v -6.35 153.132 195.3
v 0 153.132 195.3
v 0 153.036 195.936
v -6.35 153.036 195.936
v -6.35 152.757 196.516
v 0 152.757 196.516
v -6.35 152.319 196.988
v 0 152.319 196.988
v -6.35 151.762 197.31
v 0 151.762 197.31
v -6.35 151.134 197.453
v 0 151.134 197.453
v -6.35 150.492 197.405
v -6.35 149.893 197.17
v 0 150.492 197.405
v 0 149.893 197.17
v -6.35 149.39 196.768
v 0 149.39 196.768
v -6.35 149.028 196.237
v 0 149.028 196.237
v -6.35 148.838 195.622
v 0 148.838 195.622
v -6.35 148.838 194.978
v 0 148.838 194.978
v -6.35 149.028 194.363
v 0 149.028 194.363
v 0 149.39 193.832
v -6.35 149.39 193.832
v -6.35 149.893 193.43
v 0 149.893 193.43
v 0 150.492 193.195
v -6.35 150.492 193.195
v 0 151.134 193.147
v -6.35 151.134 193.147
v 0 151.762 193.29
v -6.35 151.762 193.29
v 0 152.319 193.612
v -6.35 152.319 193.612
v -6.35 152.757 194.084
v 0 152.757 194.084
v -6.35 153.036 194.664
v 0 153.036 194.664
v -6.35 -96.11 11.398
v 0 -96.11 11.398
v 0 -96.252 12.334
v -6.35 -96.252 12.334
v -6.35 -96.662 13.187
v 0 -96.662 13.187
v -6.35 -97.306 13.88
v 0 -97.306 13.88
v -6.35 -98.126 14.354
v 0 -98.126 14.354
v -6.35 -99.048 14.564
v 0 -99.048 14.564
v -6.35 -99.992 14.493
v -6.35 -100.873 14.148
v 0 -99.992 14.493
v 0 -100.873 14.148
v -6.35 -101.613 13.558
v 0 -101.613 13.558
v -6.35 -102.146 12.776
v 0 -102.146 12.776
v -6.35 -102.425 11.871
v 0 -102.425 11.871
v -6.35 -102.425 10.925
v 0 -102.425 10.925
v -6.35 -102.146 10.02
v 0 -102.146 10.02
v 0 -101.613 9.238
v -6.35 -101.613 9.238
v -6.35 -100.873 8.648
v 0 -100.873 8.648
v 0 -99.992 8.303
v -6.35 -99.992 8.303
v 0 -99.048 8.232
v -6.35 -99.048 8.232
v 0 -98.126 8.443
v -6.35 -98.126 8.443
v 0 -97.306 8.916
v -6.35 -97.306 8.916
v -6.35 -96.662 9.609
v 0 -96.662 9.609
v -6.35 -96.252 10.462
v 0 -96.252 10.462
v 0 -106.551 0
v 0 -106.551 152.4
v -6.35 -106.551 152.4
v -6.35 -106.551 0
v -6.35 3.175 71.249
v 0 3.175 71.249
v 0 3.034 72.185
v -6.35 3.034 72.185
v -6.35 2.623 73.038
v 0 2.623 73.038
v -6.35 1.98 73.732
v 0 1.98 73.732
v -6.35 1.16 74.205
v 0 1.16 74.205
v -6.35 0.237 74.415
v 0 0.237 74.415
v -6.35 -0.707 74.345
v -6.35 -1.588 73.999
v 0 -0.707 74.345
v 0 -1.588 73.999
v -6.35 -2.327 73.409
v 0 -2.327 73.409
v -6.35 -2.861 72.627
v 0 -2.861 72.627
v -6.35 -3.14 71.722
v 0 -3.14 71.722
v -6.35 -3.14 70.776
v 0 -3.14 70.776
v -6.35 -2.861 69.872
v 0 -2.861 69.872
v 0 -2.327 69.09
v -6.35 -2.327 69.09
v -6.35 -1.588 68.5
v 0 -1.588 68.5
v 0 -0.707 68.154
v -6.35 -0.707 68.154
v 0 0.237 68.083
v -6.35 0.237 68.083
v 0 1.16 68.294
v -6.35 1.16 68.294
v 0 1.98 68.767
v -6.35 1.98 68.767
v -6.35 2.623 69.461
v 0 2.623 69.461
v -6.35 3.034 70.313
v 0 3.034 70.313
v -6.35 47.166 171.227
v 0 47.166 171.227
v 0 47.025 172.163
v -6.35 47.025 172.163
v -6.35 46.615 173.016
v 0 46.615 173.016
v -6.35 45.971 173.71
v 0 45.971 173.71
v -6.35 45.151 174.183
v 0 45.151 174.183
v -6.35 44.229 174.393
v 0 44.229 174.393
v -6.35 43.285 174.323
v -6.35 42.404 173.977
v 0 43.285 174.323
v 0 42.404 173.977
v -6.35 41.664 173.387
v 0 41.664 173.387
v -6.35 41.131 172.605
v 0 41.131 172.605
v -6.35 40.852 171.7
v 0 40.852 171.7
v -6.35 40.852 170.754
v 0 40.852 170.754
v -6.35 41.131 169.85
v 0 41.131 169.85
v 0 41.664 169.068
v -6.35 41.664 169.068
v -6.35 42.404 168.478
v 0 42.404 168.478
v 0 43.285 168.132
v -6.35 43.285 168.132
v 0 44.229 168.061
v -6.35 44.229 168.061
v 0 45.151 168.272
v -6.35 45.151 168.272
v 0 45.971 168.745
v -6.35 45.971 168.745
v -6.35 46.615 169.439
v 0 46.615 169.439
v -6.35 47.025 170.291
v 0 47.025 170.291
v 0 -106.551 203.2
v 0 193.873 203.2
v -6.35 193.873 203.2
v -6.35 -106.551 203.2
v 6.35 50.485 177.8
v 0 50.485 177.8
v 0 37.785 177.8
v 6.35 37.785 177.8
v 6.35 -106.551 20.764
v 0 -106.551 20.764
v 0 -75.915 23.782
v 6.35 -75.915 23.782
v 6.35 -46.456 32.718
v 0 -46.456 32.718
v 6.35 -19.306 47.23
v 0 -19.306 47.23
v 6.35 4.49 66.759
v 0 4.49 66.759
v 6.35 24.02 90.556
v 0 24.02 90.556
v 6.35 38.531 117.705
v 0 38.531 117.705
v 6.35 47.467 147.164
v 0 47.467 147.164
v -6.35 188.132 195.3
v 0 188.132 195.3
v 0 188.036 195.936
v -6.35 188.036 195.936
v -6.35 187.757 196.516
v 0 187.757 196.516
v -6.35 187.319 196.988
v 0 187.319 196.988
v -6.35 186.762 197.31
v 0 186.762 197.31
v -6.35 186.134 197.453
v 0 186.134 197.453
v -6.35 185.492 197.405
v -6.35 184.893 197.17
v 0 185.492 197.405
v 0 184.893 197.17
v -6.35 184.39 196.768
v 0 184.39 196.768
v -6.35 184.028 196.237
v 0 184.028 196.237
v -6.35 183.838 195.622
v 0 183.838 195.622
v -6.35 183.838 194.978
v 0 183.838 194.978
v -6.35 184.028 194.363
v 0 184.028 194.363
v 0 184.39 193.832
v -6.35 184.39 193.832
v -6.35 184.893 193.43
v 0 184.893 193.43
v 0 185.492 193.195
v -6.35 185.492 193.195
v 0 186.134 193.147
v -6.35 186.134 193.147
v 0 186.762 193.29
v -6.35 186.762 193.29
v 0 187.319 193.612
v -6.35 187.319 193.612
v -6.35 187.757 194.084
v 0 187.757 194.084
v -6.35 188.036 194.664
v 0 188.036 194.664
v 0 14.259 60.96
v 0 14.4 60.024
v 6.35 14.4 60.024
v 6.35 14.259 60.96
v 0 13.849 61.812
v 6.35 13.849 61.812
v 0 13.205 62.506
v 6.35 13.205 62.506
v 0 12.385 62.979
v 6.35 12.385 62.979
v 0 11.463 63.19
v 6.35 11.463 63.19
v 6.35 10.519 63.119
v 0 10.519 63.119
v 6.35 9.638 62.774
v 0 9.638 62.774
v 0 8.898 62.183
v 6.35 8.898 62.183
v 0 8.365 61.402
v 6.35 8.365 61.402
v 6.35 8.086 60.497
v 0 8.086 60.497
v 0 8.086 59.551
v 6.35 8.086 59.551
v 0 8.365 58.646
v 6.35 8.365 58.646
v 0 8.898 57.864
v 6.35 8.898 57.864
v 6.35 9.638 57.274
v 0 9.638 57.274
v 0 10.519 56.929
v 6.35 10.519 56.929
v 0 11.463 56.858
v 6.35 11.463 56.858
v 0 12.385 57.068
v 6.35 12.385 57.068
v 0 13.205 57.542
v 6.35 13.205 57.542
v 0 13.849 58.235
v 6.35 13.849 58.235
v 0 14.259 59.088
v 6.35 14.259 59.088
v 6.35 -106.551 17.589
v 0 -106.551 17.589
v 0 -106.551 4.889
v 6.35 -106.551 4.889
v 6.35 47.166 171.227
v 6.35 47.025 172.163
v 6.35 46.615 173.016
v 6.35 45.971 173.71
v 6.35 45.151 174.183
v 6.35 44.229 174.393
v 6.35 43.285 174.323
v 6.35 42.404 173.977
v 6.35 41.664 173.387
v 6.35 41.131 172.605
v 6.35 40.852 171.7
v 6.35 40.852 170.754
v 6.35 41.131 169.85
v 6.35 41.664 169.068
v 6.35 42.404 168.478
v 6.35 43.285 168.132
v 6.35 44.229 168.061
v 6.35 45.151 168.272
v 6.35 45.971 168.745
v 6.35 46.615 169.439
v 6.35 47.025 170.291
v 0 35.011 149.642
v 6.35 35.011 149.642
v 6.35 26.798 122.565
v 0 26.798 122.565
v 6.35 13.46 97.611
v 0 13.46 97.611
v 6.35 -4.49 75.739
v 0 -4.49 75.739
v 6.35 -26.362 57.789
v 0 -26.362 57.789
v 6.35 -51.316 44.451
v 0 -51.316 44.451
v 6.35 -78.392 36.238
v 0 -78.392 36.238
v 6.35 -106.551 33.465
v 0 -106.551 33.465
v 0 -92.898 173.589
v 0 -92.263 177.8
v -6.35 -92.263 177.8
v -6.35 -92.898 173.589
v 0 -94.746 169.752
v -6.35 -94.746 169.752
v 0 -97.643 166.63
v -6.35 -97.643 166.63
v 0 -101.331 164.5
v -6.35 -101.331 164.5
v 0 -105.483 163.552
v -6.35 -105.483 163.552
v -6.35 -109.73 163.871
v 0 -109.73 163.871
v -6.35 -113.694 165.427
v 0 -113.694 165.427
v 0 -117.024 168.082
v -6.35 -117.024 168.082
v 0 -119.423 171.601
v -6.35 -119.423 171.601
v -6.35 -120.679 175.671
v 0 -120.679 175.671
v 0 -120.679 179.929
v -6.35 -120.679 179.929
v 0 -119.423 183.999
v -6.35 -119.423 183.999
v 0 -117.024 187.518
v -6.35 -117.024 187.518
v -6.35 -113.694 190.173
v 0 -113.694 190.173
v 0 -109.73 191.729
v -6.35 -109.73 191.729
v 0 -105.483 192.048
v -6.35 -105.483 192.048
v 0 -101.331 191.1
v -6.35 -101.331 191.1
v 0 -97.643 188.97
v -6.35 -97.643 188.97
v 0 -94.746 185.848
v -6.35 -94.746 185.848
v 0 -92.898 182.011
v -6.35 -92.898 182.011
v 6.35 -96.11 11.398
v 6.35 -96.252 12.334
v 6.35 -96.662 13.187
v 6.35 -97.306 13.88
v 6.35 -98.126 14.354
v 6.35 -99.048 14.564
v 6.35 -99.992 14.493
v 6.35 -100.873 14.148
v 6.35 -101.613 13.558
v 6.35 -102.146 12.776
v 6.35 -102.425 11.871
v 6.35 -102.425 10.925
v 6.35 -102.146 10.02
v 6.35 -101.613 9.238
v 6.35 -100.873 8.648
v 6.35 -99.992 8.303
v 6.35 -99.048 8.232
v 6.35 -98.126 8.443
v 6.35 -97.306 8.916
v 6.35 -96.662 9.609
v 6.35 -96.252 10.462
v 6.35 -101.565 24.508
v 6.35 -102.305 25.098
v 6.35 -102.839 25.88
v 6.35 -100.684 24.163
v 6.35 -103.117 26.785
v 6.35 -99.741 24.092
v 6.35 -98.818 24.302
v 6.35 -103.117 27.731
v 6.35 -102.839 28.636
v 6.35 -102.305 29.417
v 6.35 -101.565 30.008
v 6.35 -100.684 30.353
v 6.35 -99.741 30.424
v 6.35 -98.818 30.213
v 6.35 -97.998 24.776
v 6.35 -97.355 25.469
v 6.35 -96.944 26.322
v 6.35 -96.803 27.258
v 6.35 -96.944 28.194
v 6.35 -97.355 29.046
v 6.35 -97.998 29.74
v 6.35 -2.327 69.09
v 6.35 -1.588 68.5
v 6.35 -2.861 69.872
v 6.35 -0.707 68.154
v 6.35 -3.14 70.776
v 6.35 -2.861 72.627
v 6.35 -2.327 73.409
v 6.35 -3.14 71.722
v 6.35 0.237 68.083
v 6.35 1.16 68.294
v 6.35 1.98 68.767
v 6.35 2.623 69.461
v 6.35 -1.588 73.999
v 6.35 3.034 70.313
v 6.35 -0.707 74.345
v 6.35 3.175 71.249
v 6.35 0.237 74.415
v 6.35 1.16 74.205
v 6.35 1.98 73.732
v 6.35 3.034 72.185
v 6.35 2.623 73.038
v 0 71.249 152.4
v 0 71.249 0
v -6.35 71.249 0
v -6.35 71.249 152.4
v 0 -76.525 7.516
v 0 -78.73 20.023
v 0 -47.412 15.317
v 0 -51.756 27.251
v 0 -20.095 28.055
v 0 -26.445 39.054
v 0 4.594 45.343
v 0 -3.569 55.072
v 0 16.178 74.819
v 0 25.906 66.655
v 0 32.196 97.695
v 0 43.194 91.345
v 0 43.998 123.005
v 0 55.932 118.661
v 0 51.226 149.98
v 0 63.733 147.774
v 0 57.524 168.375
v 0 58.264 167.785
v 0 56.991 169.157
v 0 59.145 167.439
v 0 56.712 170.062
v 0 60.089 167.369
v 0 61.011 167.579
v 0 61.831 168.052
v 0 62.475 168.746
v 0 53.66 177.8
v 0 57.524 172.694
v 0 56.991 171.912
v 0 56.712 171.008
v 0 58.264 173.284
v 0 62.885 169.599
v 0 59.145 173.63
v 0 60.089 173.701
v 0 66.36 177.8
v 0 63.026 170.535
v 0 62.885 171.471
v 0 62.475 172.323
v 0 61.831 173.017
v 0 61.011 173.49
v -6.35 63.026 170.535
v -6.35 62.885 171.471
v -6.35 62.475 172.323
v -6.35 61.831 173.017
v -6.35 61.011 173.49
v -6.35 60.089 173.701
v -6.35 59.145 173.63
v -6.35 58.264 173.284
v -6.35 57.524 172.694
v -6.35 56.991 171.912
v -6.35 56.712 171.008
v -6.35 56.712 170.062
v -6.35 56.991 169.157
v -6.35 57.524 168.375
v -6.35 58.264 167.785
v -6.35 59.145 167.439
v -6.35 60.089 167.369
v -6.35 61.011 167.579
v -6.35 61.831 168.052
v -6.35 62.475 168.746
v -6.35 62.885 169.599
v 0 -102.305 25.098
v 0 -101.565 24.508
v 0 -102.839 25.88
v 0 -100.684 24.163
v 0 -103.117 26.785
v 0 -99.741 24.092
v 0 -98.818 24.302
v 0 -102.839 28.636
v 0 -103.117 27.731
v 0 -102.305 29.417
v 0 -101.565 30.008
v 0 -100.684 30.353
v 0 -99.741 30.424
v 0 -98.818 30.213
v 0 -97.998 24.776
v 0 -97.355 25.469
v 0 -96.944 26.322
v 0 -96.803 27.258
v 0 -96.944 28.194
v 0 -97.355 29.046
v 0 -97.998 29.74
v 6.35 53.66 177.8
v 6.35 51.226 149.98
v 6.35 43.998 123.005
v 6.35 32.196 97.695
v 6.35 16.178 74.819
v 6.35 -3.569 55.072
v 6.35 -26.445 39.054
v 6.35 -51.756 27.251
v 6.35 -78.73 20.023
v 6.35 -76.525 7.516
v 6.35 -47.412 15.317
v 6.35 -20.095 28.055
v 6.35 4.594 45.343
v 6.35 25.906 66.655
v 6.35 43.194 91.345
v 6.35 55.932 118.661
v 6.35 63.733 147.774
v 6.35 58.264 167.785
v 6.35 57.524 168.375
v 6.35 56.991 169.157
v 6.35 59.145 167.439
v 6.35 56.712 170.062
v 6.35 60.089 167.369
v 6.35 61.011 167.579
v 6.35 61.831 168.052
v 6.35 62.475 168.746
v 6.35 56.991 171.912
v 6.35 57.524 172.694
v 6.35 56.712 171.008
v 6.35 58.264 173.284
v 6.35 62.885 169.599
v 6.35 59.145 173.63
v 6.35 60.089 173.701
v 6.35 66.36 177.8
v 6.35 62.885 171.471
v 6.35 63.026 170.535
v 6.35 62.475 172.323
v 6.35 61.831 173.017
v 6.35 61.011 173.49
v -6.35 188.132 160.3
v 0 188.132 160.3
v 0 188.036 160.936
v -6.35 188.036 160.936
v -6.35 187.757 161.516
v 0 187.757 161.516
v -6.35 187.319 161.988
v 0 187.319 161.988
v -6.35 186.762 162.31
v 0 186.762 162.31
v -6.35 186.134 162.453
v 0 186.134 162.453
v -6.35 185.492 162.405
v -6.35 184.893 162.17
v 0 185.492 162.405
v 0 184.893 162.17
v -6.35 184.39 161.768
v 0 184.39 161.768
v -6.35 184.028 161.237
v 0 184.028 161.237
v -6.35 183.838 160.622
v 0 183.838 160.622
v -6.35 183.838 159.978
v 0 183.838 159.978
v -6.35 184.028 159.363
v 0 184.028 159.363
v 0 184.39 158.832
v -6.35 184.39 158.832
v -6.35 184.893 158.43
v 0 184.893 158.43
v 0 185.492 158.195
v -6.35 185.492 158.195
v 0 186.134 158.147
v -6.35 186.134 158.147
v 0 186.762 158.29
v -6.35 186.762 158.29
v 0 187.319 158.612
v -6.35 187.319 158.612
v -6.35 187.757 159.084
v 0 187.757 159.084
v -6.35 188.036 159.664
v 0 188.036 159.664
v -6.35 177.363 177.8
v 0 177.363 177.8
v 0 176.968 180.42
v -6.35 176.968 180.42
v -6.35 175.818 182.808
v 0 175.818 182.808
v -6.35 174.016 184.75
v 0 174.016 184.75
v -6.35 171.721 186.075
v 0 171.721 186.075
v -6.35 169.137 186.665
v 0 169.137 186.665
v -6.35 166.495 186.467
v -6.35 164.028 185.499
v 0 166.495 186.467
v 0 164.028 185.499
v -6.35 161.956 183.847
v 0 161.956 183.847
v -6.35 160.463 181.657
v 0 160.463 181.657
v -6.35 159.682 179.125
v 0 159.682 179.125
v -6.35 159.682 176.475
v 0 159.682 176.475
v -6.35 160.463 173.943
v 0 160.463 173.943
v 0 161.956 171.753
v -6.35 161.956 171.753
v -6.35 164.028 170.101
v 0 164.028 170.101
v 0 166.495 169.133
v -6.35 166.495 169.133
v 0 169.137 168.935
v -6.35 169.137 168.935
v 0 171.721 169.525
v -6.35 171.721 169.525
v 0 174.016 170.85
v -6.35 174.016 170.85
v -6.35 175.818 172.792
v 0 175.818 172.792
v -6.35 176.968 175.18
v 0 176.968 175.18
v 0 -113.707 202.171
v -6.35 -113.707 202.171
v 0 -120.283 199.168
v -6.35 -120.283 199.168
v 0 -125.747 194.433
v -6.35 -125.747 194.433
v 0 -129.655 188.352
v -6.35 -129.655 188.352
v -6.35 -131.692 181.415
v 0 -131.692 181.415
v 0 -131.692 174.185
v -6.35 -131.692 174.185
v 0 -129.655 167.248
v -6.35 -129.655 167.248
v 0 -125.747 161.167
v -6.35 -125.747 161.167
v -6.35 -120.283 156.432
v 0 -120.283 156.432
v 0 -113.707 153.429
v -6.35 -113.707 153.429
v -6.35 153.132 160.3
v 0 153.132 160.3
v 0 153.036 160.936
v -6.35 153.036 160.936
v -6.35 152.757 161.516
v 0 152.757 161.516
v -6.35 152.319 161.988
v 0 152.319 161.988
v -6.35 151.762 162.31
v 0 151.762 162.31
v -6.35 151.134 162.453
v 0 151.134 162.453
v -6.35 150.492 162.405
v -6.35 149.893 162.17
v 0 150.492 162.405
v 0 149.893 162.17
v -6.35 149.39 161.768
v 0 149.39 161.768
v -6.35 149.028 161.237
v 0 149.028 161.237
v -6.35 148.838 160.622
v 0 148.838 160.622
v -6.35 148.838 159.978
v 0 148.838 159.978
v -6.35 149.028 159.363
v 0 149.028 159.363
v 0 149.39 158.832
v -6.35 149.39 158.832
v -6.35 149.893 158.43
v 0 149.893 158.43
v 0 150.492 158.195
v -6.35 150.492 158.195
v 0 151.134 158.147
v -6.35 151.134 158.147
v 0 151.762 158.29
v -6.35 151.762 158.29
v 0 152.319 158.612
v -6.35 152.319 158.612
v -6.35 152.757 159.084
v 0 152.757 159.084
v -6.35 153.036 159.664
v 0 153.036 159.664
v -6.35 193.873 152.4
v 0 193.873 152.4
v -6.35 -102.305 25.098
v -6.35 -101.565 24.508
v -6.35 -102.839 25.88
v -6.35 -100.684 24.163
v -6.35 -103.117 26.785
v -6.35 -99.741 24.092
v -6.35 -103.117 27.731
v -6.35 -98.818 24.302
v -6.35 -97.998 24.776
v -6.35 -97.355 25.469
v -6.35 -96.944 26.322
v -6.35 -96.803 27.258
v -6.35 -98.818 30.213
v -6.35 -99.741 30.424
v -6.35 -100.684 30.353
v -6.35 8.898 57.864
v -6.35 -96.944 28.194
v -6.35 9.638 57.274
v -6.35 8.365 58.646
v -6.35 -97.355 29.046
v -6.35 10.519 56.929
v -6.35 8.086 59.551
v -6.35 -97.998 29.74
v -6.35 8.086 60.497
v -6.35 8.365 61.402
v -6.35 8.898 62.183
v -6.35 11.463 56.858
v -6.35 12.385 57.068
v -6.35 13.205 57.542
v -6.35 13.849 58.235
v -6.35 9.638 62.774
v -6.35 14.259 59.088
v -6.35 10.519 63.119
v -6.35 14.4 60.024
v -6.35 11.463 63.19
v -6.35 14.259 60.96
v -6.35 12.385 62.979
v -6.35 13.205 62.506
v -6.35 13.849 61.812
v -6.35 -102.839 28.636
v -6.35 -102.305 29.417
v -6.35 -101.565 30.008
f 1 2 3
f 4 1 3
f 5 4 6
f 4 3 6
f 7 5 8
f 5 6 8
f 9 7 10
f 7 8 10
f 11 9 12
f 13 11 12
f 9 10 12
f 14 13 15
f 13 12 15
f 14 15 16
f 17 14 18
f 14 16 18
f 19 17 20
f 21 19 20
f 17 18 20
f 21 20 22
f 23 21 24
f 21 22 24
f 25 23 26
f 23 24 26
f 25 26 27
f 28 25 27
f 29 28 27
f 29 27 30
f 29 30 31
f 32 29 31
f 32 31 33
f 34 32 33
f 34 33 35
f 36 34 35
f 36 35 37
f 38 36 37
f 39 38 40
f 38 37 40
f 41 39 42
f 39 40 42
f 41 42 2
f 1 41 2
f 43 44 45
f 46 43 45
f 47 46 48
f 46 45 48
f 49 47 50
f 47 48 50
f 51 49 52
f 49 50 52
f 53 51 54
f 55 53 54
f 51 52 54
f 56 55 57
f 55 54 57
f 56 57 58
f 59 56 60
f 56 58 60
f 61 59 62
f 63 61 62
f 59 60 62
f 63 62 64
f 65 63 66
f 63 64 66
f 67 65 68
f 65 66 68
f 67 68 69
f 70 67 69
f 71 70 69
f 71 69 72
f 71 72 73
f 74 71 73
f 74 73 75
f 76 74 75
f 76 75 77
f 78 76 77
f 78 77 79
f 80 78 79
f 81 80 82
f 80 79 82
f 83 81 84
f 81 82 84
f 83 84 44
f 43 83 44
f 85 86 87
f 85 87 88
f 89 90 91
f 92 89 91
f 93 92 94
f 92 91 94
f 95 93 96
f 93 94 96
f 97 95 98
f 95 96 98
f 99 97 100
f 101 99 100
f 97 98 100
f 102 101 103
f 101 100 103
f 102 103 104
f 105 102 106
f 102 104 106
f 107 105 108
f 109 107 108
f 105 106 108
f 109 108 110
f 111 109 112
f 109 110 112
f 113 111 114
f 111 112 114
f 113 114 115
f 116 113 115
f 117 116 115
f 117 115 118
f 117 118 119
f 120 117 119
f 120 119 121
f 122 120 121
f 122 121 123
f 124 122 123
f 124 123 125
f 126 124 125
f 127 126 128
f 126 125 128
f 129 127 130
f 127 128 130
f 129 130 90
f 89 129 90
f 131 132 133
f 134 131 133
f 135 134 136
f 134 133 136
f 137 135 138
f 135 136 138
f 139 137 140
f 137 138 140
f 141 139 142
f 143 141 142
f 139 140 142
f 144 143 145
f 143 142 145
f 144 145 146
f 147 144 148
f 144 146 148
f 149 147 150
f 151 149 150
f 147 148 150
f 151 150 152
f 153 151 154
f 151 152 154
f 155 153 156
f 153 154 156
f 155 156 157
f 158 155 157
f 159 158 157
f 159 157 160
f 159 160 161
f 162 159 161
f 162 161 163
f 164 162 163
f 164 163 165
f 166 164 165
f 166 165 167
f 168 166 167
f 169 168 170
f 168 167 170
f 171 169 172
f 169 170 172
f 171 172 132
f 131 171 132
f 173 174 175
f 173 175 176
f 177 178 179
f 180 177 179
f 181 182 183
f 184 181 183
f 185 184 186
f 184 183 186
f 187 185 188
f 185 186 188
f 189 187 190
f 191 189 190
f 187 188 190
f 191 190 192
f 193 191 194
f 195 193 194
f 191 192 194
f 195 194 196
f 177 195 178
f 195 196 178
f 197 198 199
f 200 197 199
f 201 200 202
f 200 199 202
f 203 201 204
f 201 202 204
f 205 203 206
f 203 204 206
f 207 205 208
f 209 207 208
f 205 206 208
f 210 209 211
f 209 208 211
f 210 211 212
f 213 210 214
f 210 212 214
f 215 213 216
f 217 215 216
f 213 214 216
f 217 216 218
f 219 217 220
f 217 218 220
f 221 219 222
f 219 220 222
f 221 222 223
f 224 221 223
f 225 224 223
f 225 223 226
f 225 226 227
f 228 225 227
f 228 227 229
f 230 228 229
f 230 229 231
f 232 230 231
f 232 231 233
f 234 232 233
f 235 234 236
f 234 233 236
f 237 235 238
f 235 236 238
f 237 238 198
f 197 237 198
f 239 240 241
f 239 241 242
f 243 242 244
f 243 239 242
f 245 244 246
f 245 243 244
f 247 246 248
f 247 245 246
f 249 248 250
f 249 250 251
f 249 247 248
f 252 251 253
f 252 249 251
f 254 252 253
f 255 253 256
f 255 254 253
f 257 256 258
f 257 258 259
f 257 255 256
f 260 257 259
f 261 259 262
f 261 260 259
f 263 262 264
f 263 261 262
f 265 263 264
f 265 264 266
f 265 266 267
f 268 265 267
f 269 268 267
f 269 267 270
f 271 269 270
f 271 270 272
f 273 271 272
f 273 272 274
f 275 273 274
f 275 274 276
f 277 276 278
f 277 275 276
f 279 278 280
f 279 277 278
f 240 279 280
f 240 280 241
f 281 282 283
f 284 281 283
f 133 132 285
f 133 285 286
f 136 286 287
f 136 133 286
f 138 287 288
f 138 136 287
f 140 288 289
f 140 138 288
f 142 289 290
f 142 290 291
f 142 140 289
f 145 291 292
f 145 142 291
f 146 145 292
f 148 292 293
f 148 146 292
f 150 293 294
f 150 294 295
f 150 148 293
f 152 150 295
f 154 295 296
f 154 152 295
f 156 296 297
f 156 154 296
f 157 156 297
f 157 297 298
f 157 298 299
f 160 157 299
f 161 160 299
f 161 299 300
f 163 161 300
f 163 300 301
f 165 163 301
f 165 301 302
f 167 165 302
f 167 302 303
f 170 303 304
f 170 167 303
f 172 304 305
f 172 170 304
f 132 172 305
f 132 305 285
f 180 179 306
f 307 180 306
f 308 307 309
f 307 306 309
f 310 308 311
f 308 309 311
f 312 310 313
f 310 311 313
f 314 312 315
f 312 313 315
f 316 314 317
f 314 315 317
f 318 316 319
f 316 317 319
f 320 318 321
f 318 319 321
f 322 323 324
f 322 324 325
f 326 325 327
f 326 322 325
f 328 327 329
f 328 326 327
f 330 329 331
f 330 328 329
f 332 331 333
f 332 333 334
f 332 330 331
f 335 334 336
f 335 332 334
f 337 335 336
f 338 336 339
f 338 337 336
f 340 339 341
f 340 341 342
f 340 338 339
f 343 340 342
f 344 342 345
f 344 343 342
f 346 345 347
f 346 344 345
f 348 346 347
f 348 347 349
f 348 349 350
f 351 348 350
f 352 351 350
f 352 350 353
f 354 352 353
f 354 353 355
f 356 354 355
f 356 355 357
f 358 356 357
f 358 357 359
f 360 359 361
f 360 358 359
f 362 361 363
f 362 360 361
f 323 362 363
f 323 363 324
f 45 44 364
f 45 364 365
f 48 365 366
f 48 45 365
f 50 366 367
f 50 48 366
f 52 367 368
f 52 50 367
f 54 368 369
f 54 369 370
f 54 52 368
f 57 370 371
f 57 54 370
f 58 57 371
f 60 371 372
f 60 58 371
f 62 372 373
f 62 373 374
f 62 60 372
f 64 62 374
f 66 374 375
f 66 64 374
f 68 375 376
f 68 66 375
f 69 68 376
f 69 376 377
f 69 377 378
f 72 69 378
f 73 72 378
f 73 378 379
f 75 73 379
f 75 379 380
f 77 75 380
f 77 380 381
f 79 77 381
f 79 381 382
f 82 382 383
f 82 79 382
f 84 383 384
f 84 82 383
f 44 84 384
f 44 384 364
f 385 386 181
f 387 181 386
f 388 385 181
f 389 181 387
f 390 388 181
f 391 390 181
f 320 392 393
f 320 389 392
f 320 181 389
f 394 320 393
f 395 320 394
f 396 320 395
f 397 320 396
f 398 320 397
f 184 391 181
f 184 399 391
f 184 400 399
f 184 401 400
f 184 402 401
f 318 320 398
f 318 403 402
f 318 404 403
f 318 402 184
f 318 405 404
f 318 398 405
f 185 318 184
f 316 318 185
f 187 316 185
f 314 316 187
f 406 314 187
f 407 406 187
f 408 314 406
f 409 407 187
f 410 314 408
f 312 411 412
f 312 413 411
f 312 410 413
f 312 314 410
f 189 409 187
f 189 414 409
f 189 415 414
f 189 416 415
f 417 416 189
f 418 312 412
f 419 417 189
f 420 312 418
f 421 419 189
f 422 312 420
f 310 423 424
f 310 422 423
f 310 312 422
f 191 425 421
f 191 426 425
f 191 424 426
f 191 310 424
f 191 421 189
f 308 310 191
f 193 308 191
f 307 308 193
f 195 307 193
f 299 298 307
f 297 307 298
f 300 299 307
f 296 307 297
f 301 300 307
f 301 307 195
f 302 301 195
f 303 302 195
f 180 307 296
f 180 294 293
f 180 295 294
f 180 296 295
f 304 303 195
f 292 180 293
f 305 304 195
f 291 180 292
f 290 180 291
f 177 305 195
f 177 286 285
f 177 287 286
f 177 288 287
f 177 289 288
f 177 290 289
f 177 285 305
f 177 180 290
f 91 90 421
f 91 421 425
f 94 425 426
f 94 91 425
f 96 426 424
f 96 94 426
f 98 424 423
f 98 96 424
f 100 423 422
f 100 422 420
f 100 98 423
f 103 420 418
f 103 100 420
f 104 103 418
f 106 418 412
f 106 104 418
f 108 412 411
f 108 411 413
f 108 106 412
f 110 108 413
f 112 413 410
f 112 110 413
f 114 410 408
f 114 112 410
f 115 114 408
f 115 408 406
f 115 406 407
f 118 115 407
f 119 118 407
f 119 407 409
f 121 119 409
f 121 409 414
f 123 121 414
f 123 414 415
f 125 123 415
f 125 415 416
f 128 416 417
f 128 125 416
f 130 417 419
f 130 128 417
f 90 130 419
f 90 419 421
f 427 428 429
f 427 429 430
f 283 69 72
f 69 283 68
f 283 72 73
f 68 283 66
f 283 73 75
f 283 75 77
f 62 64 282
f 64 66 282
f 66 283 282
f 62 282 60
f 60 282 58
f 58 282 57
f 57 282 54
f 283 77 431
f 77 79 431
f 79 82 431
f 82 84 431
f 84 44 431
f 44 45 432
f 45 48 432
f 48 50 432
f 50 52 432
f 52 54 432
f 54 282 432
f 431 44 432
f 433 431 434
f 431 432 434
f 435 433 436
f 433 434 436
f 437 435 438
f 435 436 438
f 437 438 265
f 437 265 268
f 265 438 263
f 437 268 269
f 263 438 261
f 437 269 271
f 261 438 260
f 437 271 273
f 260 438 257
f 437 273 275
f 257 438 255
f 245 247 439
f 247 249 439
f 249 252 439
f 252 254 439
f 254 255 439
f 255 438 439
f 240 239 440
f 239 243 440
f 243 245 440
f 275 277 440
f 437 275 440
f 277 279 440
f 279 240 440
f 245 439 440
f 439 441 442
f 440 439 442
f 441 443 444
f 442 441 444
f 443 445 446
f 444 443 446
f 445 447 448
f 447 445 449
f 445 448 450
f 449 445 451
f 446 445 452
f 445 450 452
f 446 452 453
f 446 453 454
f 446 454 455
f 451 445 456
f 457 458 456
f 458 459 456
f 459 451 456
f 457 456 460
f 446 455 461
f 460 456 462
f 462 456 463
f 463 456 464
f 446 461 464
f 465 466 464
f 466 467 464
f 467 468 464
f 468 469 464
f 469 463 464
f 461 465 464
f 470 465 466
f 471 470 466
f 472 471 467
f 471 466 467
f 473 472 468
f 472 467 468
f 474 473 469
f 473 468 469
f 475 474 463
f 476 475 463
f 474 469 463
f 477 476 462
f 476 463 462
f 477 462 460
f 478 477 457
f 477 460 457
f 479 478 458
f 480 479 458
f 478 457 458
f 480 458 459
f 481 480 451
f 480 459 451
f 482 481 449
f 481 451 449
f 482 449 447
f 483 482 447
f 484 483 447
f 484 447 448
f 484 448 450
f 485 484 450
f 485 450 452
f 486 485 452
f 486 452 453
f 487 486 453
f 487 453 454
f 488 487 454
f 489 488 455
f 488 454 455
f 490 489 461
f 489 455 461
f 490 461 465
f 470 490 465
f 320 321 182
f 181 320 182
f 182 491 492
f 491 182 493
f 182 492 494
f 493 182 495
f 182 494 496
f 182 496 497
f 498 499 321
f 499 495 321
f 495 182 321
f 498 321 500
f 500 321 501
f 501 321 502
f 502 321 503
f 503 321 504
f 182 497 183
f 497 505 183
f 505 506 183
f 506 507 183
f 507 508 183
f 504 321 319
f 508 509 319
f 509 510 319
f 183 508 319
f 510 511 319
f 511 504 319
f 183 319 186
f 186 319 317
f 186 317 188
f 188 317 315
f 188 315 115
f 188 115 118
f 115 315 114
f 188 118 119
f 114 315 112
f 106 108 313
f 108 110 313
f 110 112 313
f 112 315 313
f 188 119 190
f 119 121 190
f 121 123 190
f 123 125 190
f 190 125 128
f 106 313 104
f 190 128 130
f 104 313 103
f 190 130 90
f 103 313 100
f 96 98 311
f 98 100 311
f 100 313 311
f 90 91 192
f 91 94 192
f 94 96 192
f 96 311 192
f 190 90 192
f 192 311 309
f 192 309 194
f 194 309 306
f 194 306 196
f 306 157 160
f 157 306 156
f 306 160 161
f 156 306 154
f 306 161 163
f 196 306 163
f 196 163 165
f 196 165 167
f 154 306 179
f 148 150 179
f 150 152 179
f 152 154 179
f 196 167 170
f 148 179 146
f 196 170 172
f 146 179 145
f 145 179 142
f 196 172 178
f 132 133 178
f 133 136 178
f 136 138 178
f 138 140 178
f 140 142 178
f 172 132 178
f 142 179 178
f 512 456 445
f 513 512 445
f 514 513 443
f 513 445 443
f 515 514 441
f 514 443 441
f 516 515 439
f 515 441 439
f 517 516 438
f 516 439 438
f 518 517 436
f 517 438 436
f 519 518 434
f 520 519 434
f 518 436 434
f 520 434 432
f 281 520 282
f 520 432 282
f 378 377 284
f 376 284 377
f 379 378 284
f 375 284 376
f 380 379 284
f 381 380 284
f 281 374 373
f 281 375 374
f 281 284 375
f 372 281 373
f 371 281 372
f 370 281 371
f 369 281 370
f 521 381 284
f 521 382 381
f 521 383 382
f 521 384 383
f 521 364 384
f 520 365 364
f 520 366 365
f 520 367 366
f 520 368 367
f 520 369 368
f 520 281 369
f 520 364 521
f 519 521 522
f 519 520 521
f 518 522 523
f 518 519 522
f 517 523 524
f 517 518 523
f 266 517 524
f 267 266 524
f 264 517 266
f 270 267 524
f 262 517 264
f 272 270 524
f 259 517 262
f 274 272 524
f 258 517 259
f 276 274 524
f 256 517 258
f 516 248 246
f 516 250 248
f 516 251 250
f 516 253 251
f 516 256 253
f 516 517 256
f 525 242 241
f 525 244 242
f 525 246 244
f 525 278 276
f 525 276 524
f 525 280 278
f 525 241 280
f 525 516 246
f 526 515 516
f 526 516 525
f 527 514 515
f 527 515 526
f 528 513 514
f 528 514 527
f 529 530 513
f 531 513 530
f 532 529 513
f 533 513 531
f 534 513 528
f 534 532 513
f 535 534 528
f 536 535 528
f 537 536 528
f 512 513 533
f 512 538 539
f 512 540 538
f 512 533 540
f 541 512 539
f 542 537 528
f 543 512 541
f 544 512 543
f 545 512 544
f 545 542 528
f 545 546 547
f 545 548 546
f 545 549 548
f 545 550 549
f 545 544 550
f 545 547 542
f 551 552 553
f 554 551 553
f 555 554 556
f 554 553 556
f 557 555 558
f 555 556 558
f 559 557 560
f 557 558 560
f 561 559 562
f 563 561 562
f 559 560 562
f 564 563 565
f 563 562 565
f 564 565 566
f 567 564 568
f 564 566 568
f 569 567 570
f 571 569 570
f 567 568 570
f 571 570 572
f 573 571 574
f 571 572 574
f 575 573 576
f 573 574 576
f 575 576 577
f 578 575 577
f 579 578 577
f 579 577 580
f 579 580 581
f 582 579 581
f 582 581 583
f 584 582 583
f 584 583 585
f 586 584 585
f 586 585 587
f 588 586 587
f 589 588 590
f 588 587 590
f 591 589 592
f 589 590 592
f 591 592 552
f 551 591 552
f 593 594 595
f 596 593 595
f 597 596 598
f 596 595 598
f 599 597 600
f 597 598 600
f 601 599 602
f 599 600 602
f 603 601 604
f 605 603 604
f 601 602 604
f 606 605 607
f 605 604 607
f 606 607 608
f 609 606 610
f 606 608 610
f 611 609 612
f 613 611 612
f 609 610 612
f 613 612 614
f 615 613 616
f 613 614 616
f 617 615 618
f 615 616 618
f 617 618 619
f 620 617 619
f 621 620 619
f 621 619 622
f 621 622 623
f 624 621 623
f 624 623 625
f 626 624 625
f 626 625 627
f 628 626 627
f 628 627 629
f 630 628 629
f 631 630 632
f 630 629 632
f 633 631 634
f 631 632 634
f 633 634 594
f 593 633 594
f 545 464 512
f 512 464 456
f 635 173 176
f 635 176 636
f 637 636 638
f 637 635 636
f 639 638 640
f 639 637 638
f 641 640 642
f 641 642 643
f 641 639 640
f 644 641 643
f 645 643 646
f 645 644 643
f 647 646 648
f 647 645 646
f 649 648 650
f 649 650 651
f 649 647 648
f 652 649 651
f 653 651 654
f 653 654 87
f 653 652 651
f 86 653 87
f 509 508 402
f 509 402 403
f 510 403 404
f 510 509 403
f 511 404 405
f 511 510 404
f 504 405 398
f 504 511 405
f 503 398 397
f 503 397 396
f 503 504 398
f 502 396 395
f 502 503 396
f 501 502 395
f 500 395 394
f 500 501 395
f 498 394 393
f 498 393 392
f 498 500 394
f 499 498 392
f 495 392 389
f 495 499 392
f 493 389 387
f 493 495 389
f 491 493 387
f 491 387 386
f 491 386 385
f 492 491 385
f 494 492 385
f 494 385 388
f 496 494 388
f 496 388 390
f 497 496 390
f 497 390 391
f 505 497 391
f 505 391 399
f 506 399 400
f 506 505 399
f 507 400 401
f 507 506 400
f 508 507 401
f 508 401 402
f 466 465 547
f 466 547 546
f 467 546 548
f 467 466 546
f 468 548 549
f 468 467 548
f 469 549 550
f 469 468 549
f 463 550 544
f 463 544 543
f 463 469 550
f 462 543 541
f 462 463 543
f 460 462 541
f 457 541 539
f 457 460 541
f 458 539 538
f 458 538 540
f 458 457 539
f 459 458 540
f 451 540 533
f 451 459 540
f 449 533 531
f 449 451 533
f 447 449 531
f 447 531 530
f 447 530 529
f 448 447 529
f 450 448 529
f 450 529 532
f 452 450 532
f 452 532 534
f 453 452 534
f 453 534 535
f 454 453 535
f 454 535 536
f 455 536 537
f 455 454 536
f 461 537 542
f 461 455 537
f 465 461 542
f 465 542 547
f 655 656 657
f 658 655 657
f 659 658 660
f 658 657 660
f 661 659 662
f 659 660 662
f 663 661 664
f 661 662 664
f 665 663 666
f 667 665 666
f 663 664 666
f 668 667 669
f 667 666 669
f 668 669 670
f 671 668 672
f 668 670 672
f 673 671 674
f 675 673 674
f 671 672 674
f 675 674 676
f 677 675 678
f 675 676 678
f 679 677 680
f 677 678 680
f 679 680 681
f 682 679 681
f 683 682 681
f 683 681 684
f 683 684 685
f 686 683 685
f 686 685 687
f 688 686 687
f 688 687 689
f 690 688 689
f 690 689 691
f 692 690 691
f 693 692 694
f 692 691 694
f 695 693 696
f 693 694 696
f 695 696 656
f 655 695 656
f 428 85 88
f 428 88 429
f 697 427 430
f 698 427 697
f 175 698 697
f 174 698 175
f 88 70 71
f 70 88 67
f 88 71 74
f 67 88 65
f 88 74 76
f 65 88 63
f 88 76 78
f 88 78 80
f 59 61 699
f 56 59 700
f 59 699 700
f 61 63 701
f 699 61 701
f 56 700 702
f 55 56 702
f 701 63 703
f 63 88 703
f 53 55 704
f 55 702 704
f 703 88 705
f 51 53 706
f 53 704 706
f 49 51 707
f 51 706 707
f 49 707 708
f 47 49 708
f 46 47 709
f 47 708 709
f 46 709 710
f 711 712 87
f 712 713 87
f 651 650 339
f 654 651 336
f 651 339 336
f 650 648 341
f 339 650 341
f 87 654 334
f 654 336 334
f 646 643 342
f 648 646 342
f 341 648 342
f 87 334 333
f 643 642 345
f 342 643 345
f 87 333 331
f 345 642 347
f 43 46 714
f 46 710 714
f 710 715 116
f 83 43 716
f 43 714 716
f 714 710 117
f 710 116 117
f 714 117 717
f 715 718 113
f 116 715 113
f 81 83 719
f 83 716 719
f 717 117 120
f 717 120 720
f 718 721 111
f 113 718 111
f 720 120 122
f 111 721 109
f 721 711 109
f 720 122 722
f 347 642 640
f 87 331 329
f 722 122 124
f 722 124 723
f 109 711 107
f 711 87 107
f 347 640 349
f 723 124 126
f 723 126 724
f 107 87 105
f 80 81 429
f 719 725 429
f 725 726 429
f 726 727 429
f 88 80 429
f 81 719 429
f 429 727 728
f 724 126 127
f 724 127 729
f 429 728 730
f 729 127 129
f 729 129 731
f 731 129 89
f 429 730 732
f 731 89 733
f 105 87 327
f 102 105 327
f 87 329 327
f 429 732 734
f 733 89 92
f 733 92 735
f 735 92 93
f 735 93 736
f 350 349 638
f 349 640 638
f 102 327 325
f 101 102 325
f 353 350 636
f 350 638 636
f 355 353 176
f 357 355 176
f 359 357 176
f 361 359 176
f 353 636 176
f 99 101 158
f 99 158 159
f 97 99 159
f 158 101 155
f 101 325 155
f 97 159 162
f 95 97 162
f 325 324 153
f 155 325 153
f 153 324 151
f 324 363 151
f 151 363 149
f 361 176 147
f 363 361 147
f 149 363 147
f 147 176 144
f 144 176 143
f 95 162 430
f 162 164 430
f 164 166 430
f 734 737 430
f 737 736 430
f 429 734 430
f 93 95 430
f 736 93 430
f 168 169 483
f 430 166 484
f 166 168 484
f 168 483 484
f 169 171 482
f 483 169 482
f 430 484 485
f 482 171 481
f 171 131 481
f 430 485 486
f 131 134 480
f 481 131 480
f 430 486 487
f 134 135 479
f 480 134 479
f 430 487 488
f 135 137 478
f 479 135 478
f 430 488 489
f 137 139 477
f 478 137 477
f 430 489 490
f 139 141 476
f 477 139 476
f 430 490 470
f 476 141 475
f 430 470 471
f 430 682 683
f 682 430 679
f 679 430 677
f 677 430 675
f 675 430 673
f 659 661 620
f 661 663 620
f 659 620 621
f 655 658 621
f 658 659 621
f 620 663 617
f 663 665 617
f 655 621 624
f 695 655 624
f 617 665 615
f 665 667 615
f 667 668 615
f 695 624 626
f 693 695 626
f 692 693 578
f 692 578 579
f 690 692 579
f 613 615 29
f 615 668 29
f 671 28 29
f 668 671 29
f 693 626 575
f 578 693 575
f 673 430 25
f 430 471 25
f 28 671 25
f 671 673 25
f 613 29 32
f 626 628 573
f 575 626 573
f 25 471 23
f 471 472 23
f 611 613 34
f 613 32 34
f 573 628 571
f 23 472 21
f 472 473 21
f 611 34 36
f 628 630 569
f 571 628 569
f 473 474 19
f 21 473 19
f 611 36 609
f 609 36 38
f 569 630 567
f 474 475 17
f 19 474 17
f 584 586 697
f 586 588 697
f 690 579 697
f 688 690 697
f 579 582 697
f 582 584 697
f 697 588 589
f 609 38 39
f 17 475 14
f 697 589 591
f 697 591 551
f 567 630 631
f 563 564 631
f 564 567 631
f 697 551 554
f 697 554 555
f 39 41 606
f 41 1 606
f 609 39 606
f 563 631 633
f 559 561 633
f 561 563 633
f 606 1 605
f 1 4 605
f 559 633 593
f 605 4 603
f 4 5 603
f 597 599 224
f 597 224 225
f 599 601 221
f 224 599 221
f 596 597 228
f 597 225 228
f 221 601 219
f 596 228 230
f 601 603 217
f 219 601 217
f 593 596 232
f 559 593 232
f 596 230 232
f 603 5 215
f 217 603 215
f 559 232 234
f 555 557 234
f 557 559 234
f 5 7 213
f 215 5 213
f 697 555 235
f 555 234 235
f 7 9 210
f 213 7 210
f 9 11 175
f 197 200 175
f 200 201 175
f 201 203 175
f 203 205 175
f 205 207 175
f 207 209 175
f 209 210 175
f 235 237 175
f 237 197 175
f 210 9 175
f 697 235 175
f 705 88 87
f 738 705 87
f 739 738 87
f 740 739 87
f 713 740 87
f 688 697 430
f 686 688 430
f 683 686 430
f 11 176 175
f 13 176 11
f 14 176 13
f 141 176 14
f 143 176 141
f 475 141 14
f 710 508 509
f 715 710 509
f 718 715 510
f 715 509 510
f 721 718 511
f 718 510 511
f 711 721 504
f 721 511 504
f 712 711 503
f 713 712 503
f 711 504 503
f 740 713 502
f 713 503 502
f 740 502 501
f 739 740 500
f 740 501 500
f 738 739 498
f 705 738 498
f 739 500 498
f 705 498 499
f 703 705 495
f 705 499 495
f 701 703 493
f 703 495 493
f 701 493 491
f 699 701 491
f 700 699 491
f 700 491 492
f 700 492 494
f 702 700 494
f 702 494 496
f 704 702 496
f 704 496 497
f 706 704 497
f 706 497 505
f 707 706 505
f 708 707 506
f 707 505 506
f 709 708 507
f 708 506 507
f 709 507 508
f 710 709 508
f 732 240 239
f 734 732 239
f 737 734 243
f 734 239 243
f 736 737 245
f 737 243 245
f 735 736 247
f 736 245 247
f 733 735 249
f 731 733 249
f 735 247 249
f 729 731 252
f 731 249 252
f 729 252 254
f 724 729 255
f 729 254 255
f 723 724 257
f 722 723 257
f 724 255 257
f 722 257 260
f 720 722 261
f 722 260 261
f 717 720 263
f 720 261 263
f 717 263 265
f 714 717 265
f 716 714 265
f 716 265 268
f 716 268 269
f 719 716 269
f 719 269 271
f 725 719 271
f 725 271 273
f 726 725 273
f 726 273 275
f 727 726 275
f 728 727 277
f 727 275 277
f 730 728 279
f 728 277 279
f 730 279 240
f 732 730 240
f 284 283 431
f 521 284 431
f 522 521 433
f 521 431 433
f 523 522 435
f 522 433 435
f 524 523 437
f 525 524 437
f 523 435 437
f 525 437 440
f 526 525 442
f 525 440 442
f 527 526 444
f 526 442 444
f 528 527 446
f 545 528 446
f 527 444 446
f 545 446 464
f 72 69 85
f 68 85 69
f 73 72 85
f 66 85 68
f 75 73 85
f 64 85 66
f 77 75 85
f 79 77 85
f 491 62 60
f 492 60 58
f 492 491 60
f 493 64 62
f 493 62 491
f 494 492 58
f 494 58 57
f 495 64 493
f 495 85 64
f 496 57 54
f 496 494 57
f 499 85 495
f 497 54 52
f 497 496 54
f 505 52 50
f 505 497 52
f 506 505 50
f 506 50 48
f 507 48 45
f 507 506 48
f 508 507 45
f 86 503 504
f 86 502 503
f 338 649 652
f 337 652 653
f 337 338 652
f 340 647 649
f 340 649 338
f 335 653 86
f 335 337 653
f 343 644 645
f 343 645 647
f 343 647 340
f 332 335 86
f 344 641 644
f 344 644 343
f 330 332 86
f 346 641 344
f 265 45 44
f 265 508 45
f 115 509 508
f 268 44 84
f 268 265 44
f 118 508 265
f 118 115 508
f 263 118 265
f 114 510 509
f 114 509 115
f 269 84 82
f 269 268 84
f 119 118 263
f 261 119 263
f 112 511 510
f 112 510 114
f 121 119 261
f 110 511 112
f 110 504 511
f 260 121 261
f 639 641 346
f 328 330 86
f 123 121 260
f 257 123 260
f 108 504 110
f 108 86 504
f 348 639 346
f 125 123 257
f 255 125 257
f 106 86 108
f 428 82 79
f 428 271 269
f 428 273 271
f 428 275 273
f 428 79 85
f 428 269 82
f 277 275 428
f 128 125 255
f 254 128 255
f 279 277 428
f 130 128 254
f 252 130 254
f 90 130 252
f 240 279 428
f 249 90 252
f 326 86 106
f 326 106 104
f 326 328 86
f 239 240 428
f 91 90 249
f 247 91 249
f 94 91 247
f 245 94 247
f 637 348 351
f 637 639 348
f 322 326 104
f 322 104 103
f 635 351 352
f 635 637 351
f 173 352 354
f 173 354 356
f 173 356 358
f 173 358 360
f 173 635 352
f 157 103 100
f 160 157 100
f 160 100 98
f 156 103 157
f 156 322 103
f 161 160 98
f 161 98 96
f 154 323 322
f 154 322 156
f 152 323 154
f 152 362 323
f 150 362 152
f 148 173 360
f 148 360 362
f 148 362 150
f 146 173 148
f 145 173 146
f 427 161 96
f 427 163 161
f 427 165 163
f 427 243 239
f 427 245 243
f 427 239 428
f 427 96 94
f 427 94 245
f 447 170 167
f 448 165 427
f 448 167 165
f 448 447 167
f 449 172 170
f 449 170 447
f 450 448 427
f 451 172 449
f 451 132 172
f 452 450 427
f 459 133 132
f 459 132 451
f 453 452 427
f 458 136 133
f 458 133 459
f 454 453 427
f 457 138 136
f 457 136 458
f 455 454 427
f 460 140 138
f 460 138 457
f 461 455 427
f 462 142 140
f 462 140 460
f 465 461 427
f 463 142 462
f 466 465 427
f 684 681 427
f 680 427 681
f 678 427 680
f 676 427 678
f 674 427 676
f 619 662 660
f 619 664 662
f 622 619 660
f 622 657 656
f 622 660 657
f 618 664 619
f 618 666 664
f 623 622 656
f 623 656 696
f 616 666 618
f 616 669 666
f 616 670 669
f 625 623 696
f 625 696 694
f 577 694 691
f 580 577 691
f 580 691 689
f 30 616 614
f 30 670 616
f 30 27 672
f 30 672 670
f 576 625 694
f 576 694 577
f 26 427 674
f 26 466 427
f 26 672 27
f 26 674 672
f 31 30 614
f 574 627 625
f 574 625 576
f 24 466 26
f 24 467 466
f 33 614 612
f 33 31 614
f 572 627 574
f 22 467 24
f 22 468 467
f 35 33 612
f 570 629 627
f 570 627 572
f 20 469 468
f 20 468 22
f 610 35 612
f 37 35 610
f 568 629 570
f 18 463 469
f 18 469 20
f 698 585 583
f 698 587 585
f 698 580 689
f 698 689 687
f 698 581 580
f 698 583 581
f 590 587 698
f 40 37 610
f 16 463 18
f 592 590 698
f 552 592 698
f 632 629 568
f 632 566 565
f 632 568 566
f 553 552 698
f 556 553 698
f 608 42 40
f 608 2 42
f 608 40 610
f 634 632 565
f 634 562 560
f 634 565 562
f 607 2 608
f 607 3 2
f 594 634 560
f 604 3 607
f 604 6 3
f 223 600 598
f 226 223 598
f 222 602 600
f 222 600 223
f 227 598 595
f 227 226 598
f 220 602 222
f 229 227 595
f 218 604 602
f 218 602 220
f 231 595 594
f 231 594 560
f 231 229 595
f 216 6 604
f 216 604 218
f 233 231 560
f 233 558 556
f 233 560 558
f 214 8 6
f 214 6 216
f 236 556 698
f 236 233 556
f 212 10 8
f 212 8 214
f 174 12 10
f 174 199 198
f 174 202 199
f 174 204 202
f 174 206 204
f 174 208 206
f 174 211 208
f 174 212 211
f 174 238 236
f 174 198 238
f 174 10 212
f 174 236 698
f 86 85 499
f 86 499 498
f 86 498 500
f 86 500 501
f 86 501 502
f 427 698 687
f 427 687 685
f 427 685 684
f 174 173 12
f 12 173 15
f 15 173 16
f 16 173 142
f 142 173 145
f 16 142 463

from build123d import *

# Parameters (mm, degrees)
F0_R     = 2.159
F0_R_2   = 8.89
F0_R_3   = 3.175
F1_DEPTH = 6.35
F2_DEPTH = 6.35
F3_DEPTH = 6.35


with BuildPart() as f1:
    # F0 (on Right) → F1 (new body)
    with BuildSketch(Plane.YZ):
        with BuildLine():
            Line((-92.2632388765, 177.8), (-81.1507388765, 177.8))
            ThreePointArc((-81.1507388765, 177.8), (-88.5902266343, 195.7605122421), (-106.5507388765, 203.2))
            ThreePointArc((-106.5507388765, 203.2), (-131.9507388765, 177.8), (-106.5507388765, 152.4))
            Line((-106.5507388765, 152.4), (-106.5507388765, 163.5125))
            ThreePointArc((-106.5507388765, 163.5125), (-116.6535270127, 187.9027881362), (-92.2632388765, 177.8))
        make_face()
        with BuildLine():
            ThreePointArc((-106.5507388765, 152.4), (-88.5902266343, 159.8394877579), (-81.1507388765, 177.8))
            Line((-81.1507388765, 177.8), (-92.2632388765, 177.8))
            ThreePointArc((-92.2632388765, 177.8), (-96.4479507403, 167.6972118638), (-106.5507388765, 163.5125))
            Line((-106.5507388765, 163.5125), (-106.5507388765, 152.4))
        make_face()
        with BuildLine():
            ThreePointArc((-106.5507388765, 203.2), (-88.5902266343, 195.7605122421), (-81.1507388765, 177.8))
            Line((-81.1507388765, 177.8), (37.7847611235, 177.8))
            Line((37.7847611235, 177.8), (50.4847611235, 177.8))
            Line((50.4847611235, 177.8), (53.6597611235, 177.8))
            Line((53.6597611235, 177.8), (66.3597611235, 177.8))
            Line((66.3597611235, 177.8), (71.2492611235, 177.8))
            Line((71.2492611235, 177.8), (71.2492611235, 203.2))
            Line((71.2492611235, 203.2), (-106.5507388765, 203.2))
        make_face()
        Polygon((193.8728411235, 203.2), (71.2492611235, 203.2), (71.2492611235, 177.8), (71.2492611235, 152.4), (193.8728411235, 152.4), align=None)
        with Locations((150.9728411235, 160.3)):
            Circle(F0_R, mode=Mode.SUBTRACT)
        with Locations((185.9728411235, 160.3)):
            Circle(F0_R, mode=Mode.SUBTRACT)
        with Locations((150.9728411235, 195.3)):
            Circle(F0_R, mode=Mode.SUBTRACT)
        with Locations((168.4728411235, 177.8)):
            Circle(F0_R_2, mode=Mode.SUBTRACT)
        with Locations((185.9728411235, 195.3)):
            Circle(F0_R, mode=Mode.SUBTRACT)
        with BuildLine():
            Line((71.2492611235, 152.4), (71.2492611235, 177.8))
            Line((71.2492611235, 177.8), (66.3597611235, 177.8))
            ThreePointArc((66.3597611235, 177.8), (15.7154482119, 55.5338129116), (-106.5507388765, 4.8895))
            Line((-106.5507388765, 4.8895), (-106.5507388765, 0))
            Line((-106.5507388765, 0), (71.2492611235, 0))
            Line((71.2492611235, 0), (71.2492611235, 152.4))
        make_face()
        with BuildLine():
            Line((66.3597611235, 177.8), (53.6597611235, 177.8))
            ThreePointArc((53.6597611235, 177.8), (6.7351920908, 64.5140690327), (-106.5507388765, 17.5895))
            Line((-106.5507388765, 17.5895), (-106.5507388765, 4.8895))
            ThreePointArc((-106.5507388765, 4.8895), (15.7154482119, 55.5338129116), (66.3597611235, 177.8))
        make_face()
        with Locations((-99.2854719072, 11.3980286892)):
            Circle(F0_R_3, mode=Mode.SUBTRACT)
        with Locations((11.2253201513, 60.0239409722)):
            Circle(F0_R_3, mode=Mode.SUBTRACT)
        with Locations((59.8512324343, 170.5347330307)):
            Circle(F0_R_3, mode=Mode.SUBTRACT)
        with BuildLine():
            Line((53.6597611235, 177.8), (50.4847611235, 177.8))
            ThreePointArc((50.4847611235, 177.8), (4.4901280605, 66.759133063), (-106.5507388765, 20.7645))
            Line((-106.5507388765, 20.7645), (-106.5507388765, 17.5895))
            ThreePointArc((-106.5507388765, 17.5895), (6.7351920908, 64.5140690327), (53.6597611235, 177.8))
        make_face()
        with BuildLine():
            Line((50.4847611235, 177.8), (37.7847611235, 177.8))
            ThreePointArc((37.7847611235, 177.8), (-4.4901280605, 75.739389184), (-106.5507388765, 33.4645))
            Line((-106.5507388765, 33.4645), (-106.5507388765, 20.7645))
            ThreePointArc((-106.5507388765, 20.7645), (4.4901280605, 66.759133063), (50.4847611235, 177.8))
        make_face()
        with Locations((-99.9779296816, 27.2579192068)):
            Circle(F0_R_3, mode=Mode.SUBTRACT)
        with Locations((0, 71.2492611235)):
            Circle(F0_R_3, mode=Mode.SUBTRACT)
        with Locations((43.9913419167, 171.2271908052)):
            Circle(F0_R_3, mode=Mode.SUBTRACT)
        with BuildLine():
            Line((37.7847611235, 177.8), (-81.1507388765, 177.8))
            ThreePointArc((-81.1507388765, 177.8), (-88.5902266343, 159.8394877579), (-106.5507388765, 152.4))
            Line((-106.5507388765, 152.4), (-106.5507388765, 33.4645))
            ThreePointArc((-106.5507388765, 33.4645), (-4.4901280605, 75.739389184), (37.7847611235, 177.8))
        make_face()
    extrude(amount=-F1_DEPTH)


with BuildPart() as f2:
    # F0 (on Right) → F2 (new body)
    with BuildSketch(Plane.YZ):
        with BuildLine():
            Line((50.4847611235, 177.8), (37.7847611235, 177.8))
            ThreePointArc((37.7847611235, 177.8), (-4.4901280605, 75.739389184), (-106.5507388765, 33.4645))
            Line((-106.5507388765, 33.4645), (-106.5507388765, 20.7645))
            ThreePointArc((-106.5507388765, 20.7645), (4.4901280605, 66.759133063), (50.4847611235, 177.8))
        make_face()
        with Locations((-99.9779296816, 27.2579192068)):
            Circle(F0_R_3, mode=Mode.SUBTRACT)
        with Locations((0, 71.2492611235)):
            Circle(F0_R_3, mode=Mode.SUBTRACT)
        with Locations((43.9913419167, 171.2271908052)):
            Circle(F0_R_3, mode=Mode.SUBTRACT)
    extrude(amount=F2_DEPTH)


with BuildPart() as f3:
    # F0 (on Right) → F3 (new body)
    with BuildSketch(Plane.YZ):
        with BuildLine():
            Line((66.3597611235, 177.8), (53.6597611235, 177.8))
            ThreePointArc((53.6597611235, 177.8), (6.7351920908, 64.5140690327), (-106.5507388765, 17.5895))
            Line((-106.5507388765, 17.5895), (-106.5507388765, 4.8895))
            ThreePointArc((-106.5507388765, 4.8895), (15.7154482119, 55.5338129116), (66.3597611235, 177.8))
        make_face()
        with Locations((-99.2854719072, 11.3980286892)):
            Circle(F0_R_3, mode=Mode.SUBTRACT)
        with Locations((11.2253201513, 60.0239409722)):
            Circle(F0_R_3, mode=Mode.SUBTRACT)
        with Locations((59.8512324343, 170.5347330307)):
            Circle(F0_R_3, mode=Mode.SUBTRACT)
    extrude(amount=F3_DEPTH)


solid = Compound([f1.part, f2.part, f3.part])
